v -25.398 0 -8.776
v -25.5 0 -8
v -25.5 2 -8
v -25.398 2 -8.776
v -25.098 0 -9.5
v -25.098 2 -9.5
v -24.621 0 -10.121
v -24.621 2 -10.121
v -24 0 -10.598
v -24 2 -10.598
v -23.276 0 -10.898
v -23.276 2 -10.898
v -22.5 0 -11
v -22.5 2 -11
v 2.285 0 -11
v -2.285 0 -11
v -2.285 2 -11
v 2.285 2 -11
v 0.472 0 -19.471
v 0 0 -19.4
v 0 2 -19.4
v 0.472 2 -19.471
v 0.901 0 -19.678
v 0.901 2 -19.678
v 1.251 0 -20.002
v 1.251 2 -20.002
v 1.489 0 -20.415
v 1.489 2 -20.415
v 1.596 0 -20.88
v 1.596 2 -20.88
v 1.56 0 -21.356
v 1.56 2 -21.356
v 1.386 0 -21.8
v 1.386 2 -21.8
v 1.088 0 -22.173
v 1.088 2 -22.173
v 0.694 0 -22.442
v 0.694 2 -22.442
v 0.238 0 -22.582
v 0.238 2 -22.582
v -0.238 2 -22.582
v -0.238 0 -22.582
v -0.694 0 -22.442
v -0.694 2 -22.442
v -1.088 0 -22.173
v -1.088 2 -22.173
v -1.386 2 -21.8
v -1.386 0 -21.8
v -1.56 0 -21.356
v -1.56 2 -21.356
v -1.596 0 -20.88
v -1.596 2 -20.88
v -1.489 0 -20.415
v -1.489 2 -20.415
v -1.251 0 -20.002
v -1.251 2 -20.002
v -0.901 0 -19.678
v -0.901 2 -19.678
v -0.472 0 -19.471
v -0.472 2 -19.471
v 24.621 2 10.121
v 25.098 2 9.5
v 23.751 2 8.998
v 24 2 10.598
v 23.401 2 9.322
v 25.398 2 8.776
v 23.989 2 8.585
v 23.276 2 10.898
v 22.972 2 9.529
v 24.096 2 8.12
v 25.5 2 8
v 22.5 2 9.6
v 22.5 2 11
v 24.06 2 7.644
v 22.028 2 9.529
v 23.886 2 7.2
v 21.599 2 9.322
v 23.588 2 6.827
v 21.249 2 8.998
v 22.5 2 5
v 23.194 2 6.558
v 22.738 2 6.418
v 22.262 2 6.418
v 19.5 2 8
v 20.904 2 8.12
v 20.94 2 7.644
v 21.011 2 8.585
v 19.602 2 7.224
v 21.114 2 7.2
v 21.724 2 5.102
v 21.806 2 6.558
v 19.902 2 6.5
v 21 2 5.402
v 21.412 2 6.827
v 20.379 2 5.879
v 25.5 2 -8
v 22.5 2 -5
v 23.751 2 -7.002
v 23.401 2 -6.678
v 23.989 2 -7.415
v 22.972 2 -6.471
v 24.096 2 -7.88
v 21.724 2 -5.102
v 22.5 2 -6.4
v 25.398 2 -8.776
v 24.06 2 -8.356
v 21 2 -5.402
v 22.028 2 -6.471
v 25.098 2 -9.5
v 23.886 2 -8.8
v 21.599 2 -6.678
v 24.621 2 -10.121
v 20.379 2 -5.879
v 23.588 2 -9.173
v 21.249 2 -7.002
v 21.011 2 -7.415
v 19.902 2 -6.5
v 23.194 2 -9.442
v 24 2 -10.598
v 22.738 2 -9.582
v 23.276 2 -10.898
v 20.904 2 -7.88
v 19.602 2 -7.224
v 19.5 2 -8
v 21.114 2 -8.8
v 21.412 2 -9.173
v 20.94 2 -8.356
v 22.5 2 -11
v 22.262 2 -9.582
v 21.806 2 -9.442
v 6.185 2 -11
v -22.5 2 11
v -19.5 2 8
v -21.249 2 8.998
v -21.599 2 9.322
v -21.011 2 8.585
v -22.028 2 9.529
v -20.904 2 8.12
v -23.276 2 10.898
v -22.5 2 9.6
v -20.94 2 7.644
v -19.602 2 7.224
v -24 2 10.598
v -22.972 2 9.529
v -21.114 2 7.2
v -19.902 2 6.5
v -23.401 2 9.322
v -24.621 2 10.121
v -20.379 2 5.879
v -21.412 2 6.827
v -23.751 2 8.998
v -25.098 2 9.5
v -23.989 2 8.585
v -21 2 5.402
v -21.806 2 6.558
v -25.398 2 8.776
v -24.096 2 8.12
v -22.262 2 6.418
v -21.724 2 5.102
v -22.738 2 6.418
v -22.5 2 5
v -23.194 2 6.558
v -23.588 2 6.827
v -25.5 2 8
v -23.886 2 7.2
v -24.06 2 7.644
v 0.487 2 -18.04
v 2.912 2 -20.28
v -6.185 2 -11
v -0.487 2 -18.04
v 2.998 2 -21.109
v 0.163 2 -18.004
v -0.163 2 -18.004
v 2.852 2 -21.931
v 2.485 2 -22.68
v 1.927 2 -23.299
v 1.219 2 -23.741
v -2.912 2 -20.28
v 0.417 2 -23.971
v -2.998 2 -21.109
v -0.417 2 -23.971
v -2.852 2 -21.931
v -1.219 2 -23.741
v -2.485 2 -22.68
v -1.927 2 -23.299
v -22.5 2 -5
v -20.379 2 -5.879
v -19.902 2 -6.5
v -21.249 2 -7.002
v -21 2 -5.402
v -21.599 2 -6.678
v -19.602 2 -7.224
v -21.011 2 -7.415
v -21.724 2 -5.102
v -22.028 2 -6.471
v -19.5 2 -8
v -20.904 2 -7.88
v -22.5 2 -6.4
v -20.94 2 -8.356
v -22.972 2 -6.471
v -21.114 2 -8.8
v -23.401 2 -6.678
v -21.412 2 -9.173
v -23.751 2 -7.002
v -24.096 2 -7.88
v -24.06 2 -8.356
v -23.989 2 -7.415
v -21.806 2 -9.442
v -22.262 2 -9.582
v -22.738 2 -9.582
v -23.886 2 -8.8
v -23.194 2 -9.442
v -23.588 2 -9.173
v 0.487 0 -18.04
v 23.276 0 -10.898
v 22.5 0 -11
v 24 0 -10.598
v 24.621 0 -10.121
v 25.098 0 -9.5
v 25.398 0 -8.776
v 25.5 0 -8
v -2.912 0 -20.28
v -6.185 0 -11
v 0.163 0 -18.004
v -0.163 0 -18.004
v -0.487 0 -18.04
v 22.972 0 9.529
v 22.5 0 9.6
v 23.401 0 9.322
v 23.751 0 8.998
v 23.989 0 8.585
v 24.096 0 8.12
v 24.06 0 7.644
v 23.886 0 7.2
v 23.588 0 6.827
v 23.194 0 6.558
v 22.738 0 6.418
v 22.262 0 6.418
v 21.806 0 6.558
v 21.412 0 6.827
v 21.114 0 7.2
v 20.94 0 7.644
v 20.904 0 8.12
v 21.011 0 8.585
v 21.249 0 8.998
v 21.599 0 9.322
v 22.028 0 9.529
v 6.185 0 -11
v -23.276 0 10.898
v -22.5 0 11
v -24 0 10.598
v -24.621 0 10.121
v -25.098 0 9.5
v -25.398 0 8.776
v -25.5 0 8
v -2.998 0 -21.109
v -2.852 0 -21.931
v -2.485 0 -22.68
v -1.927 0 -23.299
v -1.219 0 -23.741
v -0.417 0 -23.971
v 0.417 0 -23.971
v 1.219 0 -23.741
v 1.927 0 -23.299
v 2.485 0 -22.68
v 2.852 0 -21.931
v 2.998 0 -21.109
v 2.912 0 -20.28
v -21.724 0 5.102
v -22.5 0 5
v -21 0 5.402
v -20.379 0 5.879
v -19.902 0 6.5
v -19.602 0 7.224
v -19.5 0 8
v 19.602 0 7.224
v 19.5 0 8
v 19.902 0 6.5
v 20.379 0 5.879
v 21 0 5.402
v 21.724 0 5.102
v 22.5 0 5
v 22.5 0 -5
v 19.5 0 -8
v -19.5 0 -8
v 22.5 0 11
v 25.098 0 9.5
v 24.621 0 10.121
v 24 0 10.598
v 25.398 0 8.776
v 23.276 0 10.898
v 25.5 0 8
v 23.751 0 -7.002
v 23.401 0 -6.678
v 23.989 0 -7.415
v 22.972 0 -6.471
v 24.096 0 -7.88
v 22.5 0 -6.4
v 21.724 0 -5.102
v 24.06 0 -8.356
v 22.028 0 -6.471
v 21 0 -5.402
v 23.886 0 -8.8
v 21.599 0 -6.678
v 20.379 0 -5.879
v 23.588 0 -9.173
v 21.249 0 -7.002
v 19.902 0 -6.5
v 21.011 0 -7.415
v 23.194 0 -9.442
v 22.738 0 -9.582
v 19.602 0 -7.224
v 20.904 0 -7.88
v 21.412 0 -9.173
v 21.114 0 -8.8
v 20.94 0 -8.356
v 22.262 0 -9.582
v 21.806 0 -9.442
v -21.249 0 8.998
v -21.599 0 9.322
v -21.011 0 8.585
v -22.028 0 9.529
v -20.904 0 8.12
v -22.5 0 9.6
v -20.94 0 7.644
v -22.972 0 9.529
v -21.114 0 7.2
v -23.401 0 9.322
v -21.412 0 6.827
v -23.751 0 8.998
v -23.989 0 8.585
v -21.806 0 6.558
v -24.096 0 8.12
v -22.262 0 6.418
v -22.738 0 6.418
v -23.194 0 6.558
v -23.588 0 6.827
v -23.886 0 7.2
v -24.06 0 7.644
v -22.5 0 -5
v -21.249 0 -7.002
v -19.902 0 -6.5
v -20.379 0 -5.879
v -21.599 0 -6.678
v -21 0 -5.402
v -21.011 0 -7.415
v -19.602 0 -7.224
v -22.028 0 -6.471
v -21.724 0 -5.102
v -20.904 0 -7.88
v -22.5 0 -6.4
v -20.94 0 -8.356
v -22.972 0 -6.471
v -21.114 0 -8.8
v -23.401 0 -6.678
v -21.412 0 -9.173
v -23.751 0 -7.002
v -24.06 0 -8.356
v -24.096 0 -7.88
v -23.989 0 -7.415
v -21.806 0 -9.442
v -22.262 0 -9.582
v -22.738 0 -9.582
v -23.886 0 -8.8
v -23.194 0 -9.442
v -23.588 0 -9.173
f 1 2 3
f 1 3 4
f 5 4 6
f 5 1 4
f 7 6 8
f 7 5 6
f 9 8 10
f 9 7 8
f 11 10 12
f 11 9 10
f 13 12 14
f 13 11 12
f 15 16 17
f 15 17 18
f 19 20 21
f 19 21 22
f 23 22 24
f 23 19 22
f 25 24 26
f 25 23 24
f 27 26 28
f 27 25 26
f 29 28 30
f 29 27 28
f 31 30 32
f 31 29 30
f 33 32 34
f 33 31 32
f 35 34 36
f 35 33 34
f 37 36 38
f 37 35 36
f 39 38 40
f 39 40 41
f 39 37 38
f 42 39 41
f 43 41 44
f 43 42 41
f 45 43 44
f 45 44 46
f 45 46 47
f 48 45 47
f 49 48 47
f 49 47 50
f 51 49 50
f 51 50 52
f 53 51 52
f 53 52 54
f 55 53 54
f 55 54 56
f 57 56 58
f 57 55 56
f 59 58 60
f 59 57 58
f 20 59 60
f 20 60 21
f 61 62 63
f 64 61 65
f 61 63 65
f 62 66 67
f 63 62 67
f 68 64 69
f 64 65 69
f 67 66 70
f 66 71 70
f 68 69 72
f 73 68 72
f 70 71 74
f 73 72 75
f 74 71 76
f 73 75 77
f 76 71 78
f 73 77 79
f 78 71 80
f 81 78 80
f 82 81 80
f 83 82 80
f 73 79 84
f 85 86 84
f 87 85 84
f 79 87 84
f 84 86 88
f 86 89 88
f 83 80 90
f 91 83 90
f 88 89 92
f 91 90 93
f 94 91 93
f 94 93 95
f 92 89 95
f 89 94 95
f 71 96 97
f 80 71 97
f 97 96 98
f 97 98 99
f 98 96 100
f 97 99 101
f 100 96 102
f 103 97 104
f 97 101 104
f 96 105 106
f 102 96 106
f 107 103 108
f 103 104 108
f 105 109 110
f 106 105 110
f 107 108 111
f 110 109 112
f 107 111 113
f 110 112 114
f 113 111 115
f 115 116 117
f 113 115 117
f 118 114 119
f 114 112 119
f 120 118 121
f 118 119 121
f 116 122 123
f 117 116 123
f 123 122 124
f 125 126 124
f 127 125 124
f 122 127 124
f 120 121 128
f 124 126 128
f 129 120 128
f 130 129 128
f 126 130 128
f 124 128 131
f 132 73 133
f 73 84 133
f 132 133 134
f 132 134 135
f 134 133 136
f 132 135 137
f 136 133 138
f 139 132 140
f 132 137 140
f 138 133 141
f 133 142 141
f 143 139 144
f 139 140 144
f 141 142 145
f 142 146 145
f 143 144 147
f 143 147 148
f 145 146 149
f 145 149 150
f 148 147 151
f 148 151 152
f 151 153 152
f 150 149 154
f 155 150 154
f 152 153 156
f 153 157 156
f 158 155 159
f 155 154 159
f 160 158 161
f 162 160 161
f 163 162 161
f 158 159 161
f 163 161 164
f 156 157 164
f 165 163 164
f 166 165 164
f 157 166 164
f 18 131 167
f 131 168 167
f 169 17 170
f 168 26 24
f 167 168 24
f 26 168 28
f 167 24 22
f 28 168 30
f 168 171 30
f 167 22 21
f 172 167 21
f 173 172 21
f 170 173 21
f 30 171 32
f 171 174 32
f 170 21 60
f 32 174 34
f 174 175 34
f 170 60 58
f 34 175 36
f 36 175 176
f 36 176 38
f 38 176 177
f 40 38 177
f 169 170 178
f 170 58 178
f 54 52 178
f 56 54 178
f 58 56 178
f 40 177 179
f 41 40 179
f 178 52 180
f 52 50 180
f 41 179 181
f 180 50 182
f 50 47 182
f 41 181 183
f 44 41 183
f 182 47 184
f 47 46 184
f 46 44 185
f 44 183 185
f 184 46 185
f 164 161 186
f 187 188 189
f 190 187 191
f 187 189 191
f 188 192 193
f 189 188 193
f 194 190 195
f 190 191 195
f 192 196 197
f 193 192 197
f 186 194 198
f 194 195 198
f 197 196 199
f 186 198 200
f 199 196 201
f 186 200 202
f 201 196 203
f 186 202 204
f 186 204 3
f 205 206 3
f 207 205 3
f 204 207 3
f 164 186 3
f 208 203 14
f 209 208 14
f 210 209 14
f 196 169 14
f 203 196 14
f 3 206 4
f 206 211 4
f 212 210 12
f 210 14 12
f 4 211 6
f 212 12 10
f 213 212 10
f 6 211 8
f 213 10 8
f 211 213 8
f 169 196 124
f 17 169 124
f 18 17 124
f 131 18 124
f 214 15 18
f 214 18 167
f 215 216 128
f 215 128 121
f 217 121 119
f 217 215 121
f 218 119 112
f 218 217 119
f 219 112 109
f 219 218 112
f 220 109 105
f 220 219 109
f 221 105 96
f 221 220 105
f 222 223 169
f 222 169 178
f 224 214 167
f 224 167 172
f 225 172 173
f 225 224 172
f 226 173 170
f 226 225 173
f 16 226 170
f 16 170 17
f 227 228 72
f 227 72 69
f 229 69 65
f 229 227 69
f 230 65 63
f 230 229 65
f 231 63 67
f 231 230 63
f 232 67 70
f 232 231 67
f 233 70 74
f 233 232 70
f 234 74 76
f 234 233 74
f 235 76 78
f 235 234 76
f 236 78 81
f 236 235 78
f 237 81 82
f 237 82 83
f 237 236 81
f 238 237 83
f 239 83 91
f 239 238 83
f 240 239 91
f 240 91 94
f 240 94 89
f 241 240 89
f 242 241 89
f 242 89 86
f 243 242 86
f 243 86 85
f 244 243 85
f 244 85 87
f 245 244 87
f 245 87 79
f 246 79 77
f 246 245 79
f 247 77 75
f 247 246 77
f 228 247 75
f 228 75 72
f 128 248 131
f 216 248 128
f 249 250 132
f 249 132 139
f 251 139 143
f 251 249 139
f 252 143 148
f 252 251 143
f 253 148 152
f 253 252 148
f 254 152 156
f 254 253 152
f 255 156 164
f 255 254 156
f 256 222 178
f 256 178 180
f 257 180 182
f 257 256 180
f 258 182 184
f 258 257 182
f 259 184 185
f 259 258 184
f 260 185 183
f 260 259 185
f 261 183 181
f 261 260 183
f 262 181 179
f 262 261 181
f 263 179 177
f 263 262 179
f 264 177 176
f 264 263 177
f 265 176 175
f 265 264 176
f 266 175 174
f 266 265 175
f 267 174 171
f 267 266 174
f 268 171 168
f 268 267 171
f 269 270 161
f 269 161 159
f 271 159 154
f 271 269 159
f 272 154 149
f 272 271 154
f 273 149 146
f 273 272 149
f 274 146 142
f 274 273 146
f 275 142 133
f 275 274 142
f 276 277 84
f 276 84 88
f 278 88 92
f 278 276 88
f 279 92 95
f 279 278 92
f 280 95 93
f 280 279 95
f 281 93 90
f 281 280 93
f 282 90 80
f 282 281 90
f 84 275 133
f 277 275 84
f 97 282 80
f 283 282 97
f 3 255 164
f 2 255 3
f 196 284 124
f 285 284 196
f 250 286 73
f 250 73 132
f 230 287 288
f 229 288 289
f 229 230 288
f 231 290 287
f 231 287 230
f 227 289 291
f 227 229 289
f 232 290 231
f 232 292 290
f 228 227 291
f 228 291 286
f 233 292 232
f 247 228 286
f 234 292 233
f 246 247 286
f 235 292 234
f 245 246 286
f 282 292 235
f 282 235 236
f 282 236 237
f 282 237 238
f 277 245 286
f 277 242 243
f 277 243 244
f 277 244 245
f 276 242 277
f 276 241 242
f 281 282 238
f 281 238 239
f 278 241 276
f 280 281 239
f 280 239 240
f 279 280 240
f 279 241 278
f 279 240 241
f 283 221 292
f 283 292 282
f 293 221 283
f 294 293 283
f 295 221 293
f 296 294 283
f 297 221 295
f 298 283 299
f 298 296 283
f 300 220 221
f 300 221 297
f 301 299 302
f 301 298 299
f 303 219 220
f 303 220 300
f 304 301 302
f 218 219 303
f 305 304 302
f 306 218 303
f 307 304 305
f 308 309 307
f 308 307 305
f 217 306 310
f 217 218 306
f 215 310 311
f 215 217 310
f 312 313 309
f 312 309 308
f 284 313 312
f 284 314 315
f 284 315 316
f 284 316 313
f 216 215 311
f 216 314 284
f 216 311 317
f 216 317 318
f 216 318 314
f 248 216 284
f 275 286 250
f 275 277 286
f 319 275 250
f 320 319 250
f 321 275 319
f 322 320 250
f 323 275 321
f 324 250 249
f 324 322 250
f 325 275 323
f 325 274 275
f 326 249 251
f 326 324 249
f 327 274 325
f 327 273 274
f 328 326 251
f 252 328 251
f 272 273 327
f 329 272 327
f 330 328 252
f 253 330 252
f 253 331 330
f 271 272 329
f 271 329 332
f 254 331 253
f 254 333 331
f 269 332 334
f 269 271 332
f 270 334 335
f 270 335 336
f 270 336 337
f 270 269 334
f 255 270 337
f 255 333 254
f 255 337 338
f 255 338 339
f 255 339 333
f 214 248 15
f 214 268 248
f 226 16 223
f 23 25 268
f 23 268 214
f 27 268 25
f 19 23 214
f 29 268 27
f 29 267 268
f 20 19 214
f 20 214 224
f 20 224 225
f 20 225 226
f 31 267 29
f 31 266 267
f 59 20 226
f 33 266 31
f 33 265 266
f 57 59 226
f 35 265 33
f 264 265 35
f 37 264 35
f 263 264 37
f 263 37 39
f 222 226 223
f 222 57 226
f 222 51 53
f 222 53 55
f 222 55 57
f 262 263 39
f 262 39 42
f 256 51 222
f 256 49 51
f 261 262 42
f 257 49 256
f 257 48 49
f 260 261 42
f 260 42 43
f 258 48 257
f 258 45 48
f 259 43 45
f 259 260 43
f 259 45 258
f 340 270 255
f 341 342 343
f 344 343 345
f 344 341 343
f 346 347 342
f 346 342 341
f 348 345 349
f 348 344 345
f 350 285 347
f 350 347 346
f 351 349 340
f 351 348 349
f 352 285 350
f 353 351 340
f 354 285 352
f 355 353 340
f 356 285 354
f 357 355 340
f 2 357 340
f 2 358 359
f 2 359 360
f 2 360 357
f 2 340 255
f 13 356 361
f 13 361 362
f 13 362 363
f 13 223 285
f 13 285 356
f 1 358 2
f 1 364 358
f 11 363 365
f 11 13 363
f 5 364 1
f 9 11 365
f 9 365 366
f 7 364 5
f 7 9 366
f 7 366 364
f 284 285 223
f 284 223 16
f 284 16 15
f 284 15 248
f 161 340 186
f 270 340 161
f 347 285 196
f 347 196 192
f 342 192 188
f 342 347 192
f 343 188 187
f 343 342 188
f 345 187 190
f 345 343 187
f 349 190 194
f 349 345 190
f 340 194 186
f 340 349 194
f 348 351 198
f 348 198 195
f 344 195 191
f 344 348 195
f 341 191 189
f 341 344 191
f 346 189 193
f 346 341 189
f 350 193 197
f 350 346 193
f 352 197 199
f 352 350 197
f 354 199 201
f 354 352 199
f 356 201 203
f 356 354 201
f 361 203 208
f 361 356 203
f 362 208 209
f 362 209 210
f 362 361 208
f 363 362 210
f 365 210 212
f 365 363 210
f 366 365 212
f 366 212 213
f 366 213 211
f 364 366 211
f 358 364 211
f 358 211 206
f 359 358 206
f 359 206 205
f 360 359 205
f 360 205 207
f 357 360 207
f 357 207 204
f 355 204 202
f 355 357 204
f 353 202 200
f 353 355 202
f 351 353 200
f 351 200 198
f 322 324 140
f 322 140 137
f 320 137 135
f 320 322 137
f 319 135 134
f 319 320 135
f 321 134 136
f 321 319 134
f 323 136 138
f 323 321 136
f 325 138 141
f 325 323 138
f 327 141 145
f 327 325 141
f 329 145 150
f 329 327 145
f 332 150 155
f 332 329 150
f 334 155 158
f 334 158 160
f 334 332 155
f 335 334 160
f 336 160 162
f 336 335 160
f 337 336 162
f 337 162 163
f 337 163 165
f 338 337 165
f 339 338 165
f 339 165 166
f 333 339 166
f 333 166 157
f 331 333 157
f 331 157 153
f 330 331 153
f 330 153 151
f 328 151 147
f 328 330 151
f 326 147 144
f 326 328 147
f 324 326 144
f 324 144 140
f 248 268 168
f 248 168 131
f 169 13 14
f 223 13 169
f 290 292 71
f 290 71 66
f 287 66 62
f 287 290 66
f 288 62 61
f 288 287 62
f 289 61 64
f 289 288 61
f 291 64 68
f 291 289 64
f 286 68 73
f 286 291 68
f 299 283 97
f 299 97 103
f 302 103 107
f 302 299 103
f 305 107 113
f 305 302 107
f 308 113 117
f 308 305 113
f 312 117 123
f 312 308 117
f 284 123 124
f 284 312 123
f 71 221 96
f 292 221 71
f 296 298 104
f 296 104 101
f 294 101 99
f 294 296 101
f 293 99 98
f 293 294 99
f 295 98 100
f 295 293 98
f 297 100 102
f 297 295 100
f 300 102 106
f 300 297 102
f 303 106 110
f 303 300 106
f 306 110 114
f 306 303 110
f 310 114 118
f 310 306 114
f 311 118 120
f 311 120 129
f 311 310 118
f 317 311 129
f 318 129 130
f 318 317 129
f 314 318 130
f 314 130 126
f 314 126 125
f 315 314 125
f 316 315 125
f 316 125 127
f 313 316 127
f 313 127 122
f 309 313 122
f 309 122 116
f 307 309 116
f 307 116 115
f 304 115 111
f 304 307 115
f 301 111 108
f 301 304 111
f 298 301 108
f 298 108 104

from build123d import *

# Parameters (mm, degrees)
SKETCH1_R           = 1.6
BOSS_EXTRUDE1_DEPTH = 2


with BuildPart() as part:
    # Sketch1 → Boss-Extrude1 (new body)
    with BuildSketch(Plane(origin=(0, 0, 0), x_dir=(1, 0, 0), z_dir=(0, 1, 0))):
        with BuildLine():
            Line((6.185029122, 11), (22.5, 11))
            ThreePointArc((22.5, 11), (24.621320344, 10.121320344), (25.5, 8))
            Line((25.5, 8), (25.5, -8))
            ThreePointArc((25.5, -8), (24.621320344, -10.121320344), (22.5, -11))
            Line((22.5, -11), (-22.5, -11))
            ThreePointArc((-22.5, -11), (-24.621320344, -10.121320344), (-25.5, -8))
            Line((-25.5, -8), (-25.5, 8))
            ThreePointArc((-25.5, 8), (-24.621320344, 10.121320344), (-22.5, 11))
            Line((-22.5, 11), (-6.185029122, 11))
            Line((-6.185029122, 11), (-2.912197092, 20.279508432))
            ThreePointArc((-2.912197092, 20.279508432), (0, 24), (2.912197092, 20.279508432))
            Line((2.912197092, 20.279508432), (6.185029122, 11))
        make_face()
        with Locations(Location((-22.5, 8, 0), (0, 0, 270))):
            Circle(SKETCH1_R, mode=Mode.SUBTRACT)
        with Locations(Location((-22.5, -8, 0), (0, 0, 270))):
            Circle(SKETCH1_R, mode=Mode.SUBTRACT)
        with Locations(Location((22.5, -8, 0), (0, 0, 270))):
            Circle(SKETCH1_R, mode=Mode.SUBTRACT)
        with Locations(Location((22.5, 8, 0), (0, 0, 270))):
            Circle(SKETCH1_R, mode=Mode.SUBTRACT)
        with Locations(Location((0, 21, 0), (0, 0, 270))):
            Circle(SKETCH1_R, mode=Mode.SUBTRACT)
        with BuildLine():
            Line((-0.487430468, 18.039862919), (-2.28542798, 11))
            Line((-2.28542798, 11), (2.28542798, 11))
            Line((2.28542798, 11), (0.487430468, 18.039862919))
            ThreePointArc((0.487430468, 18.039862919), (0, 18), (-0.487430468, 18.039862919))
        make_face(mode=Mode.SUBTRACT)
        with BuildLine():
            Line((-19.5, -8), (19.5, -8))
            ThreePointArc((19.5, -8), (20.378679656, -5.878679656), (22.5, -5))
            Line((22.5, -5), (22.5, 5))
            ThreePointArc((22.5, 5), (20.378679656, 5.878679656), (19.5, 8))
            Line((19.5, 8), (-19.5, 8))
            ThreePointArc((-19.5, 8), (-20.378679656, 5.878679656), (-22.5, 5))
            Line((-22.5, 5), (-22.5, -5))
            ThreePointArc((-22.5, -5), (-20.378679656, -5.878679656), (-19.5, -8))
        make_face(mode=Mode.SUBTRACT)
    extrude(amount=BOSS_EXTRUDE1_DEPTH)


solid = part.part
